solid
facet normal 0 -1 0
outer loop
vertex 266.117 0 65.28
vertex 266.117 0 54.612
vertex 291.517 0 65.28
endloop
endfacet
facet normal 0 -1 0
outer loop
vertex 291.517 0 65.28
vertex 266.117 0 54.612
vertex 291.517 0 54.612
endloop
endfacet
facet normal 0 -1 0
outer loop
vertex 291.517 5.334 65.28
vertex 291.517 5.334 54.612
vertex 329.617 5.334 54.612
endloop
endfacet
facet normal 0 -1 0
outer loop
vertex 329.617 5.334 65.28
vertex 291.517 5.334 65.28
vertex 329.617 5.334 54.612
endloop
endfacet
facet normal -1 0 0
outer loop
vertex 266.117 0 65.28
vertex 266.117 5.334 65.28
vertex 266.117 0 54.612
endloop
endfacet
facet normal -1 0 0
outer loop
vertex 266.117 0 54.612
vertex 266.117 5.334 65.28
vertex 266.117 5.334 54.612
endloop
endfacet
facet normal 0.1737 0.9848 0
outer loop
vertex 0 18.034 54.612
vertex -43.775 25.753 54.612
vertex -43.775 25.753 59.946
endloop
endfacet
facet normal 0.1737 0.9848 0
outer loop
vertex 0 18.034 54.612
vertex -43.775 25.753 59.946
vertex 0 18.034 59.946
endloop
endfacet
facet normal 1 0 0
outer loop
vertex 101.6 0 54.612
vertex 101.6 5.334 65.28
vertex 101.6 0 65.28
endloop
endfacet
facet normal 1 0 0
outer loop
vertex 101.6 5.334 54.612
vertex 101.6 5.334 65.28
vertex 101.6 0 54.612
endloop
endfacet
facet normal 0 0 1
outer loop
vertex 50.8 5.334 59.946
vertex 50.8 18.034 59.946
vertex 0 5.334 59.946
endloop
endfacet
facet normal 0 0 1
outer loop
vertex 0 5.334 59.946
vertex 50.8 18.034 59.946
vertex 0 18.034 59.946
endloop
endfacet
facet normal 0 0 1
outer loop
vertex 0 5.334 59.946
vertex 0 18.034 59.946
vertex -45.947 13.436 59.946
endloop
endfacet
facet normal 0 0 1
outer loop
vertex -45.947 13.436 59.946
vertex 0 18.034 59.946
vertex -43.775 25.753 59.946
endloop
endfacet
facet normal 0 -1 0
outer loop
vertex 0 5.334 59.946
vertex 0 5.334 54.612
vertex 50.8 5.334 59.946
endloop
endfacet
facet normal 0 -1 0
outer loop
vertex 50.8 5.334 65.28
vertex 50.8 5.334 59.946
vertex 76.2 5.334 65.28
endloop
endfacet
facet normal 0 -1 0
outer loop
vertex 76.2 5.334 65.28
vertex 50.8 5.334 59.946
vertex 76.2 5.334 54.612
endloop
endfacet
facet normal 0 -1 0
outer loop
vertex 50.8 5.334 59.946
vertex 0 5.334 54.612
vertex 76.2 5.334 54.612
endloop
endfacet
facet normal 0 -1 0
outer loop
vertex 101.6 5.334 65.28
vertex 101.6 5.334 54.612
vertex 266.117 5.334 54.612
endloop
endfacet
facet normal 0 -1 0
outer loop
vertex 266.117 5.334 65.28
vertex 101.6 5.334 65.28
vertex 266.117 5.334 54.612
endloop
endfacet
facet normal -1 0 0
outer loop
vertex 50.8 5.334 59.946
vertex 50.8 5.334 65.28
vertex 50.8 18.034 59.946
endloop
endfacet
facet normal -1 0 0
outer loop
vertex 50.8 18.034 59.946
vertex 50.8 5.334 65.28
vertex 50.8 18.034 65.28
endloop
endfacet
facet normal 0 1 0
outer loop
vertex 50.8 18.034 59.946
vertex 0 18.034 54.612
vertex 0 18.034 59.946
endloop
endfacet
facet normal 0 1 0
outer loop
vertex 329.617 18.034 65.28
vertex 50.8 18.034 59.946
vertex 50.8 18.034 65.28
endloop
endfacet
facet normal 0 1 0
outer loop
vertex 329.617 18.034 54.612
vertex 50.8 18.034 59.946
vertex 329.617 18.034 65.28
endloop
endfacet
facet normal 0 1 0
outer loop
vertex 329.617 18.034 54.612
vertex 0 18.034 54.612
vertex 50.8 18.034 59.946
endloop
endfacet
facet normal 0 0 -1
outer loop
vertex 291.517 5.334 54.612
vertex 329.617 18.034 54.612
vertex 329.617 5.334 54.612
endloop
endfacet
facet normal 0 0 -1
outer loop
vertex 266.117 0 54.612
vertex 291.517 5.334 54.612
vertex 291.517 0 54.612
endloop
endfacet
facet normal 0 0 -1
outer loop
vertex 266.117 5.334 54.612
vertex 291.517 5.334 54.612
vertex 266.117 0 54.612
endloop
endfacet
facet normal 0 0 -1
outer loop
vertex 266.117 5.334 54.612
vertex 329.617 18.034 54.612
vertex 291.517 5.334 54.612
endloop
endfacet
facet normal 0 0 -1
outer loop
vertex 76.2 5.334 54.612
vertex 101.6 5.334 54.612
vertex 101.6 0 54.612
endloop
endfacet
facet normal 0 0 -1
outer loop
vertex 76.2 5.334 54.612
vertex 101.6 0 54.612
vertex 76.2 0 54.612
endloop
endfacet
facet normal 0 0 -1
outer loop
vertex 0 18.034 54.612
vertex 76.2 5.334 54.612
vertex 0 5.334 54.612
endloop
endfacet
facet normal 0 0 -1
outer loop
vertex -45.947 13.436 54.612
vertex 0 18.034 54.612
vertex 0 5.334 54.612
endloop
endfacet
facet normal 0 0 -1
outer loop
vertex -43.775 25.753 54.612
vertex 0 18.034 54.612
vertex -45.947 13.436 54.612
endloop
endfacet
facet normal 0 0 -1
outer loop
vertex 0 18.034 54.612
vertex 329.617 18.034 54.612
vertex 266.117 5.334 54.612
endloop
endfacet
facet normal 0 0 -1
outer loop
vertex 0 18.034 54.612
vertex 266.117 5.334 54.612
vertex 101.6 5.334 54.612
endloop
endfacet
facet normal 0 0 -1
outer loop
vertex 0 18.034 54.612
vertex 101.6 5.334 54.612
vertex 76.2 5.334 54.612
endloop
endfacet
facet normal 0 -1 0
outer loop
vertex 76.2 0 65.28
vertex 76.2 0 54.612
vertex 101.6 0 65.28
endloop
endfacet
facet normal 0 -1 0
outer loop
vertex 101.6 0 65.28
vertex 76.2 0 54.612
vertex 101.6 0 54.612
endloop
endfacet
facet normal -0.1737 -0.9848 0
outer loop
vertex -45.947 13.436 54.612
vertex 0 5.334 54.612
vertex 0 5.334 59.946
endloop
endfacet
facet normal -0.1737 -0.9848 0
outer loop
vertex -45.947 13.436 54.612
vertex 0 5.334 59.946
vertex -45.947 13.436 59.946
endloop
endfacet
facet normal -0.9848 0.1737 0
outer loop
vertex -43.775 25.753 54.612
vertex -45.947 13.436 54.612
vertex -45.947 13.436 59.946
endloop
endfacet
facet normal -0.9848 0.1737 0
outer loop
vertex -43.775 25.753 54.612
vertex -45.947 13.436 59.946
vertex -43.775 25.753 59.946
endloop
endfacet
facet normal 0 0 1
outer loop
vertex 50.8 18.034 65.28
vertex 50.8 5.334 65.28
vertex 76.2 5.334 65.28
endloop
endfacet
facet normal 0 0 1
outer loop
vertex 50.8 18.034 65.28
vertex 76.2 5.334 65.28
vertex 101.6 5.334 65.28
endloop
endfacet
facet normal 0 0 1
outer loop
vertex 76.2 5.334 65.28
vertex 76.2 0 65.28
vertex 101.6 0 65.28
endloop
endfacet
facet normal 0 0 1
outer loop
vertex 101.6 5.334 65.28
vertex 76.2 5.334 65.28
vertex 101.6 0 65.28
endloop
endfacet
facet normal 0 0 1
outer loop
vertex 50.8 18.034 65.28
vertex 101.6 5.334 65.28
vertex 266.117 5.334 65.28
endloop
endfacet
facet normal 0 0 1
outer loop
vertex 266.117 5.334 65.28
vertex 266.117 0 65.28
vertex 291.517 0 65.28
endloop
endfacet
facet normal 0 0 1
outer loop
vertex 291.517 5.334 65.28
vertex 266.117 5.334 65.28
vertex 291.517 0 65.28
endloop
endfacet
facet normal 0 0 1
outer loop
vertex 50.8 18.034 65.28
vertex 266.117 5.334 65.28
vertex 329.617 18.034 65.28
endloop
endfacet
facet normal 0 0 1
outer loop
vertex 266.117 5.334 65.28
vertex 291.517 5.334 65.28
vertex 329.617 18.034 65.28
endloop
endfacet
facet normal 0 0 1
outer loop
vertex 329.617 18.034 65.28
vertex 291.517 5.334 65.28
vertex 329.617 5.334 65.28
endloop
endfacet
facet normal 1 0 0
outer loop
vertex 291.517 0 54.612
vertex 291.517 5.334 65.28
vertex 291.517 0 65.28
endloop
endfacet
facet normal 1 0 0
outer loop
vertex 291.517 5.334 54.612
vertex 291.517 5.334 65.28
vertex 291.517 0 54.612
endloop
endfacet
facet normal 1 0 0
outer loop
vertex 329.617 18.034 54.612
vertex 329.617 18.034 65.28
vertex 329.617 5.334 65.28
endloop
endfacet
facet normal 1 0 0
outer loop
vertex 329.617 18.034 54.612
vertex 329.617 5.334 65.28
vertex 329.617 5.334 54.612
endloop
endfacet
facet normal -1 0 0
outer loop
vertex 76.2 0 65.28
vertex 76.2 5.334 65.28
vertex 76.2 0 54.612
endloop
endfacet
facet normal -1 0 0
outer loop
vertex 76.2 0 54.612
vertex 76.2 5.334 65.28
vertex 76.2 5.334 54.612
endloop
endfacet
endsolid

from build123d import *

# Parameters (mm, degrees)
SKETCH1_W             = 25.4
SKETCH1_H             = 10.668
BOSS_EXTRUDE1_DEPTH   = 5.334
BOSS_EXTRUDE1_2_DEPTH = 5.334
SKETCH1_3_W           = 329.617035208
SKETCH1_3_H           = 10.668
BOSS_EXTRUDE2_DEPTH   = 12.7
DIHEDRAL_ANGLE_DEPTH  = 5.334
SKETCH3_W             = 50.8
SKETCH3_H             = 12.7
CUT_EXTRUDE1_DEPTH    = 5.334


with BuildPart() as part:
    # Sketch1 → Boss-Extrude1 (new body)
    with BuildSketch(Plane(origin=(0, 5.334, 0), x_dir=(1, 0, 0), z_dir=(0, 1, 0))):
        with Locations((88.9, -59.945526857)):
            Rectangle(SKETCH1_W, SKETCH1_H)
    extrude(amount=-BOSS_EXTRUDE1_DEPTH)



with BuildPart() as body_2:
    # Sketch1 → Boss-Extrude1 2 (new body)
    with BuildSketch(Plane(origin=(0, 5.334, 0), x_dir=(1, 0, 0), z_dir=(0, 1, 0))):
        with Locations((278.817035208, -59.945526857)):
            Rectangle(SKETCH1_W, SKETCH1_H)
    extrude(amount=-BOSS_EXTRUDE1_2_DEPTH)


with BuildPart() as part_1:
    add(part.part)

    add(body_2.part)  # Boss-Extrude2 merges body 2
    # Sketch1<3> → Boss-Extrude2 (add)
    with BuildSketch(Plane(origin=(0, 5.334, 0), x_dir=(1, 0, 0), z_dir=(0, 1, 0))):
        with Locations((164.808517604, -59.945526857)):
            Rectangle(SKETCH1_3_W, SKETCH1_3_H)
    extrude(amount=BOSS_EXTRUDE2_DEPTH)

    # Sketch2 → Dihedral Angle (add)
    with BuildSketch(Plane(origin=(0, 0, 54.611526857), x_dir=(-1, 0, 0), z_dir=(0, 0, -1))):
        Polygon((0, 5.334), (45.946532532, 13.435613355), (43.774704621, 25.752661497), (0, 18.034), align=None)
    extrude(amount=-DIHEDRAL_ANGLE_DEPTH)

    # Sketch3 → Cut-Extrude1 (cut)
    with BuildSketch(Plane.XY.offset(65.279526857)):
        with Locations((25.4, 11.684)):
            Rectangle(SKETCH3_W, SKETCH3_H)
    extrude(amount=-CUT_EXTRUDE1_DEPTH, mode=Mode.SUBTRACT)


solid = part_1.part
